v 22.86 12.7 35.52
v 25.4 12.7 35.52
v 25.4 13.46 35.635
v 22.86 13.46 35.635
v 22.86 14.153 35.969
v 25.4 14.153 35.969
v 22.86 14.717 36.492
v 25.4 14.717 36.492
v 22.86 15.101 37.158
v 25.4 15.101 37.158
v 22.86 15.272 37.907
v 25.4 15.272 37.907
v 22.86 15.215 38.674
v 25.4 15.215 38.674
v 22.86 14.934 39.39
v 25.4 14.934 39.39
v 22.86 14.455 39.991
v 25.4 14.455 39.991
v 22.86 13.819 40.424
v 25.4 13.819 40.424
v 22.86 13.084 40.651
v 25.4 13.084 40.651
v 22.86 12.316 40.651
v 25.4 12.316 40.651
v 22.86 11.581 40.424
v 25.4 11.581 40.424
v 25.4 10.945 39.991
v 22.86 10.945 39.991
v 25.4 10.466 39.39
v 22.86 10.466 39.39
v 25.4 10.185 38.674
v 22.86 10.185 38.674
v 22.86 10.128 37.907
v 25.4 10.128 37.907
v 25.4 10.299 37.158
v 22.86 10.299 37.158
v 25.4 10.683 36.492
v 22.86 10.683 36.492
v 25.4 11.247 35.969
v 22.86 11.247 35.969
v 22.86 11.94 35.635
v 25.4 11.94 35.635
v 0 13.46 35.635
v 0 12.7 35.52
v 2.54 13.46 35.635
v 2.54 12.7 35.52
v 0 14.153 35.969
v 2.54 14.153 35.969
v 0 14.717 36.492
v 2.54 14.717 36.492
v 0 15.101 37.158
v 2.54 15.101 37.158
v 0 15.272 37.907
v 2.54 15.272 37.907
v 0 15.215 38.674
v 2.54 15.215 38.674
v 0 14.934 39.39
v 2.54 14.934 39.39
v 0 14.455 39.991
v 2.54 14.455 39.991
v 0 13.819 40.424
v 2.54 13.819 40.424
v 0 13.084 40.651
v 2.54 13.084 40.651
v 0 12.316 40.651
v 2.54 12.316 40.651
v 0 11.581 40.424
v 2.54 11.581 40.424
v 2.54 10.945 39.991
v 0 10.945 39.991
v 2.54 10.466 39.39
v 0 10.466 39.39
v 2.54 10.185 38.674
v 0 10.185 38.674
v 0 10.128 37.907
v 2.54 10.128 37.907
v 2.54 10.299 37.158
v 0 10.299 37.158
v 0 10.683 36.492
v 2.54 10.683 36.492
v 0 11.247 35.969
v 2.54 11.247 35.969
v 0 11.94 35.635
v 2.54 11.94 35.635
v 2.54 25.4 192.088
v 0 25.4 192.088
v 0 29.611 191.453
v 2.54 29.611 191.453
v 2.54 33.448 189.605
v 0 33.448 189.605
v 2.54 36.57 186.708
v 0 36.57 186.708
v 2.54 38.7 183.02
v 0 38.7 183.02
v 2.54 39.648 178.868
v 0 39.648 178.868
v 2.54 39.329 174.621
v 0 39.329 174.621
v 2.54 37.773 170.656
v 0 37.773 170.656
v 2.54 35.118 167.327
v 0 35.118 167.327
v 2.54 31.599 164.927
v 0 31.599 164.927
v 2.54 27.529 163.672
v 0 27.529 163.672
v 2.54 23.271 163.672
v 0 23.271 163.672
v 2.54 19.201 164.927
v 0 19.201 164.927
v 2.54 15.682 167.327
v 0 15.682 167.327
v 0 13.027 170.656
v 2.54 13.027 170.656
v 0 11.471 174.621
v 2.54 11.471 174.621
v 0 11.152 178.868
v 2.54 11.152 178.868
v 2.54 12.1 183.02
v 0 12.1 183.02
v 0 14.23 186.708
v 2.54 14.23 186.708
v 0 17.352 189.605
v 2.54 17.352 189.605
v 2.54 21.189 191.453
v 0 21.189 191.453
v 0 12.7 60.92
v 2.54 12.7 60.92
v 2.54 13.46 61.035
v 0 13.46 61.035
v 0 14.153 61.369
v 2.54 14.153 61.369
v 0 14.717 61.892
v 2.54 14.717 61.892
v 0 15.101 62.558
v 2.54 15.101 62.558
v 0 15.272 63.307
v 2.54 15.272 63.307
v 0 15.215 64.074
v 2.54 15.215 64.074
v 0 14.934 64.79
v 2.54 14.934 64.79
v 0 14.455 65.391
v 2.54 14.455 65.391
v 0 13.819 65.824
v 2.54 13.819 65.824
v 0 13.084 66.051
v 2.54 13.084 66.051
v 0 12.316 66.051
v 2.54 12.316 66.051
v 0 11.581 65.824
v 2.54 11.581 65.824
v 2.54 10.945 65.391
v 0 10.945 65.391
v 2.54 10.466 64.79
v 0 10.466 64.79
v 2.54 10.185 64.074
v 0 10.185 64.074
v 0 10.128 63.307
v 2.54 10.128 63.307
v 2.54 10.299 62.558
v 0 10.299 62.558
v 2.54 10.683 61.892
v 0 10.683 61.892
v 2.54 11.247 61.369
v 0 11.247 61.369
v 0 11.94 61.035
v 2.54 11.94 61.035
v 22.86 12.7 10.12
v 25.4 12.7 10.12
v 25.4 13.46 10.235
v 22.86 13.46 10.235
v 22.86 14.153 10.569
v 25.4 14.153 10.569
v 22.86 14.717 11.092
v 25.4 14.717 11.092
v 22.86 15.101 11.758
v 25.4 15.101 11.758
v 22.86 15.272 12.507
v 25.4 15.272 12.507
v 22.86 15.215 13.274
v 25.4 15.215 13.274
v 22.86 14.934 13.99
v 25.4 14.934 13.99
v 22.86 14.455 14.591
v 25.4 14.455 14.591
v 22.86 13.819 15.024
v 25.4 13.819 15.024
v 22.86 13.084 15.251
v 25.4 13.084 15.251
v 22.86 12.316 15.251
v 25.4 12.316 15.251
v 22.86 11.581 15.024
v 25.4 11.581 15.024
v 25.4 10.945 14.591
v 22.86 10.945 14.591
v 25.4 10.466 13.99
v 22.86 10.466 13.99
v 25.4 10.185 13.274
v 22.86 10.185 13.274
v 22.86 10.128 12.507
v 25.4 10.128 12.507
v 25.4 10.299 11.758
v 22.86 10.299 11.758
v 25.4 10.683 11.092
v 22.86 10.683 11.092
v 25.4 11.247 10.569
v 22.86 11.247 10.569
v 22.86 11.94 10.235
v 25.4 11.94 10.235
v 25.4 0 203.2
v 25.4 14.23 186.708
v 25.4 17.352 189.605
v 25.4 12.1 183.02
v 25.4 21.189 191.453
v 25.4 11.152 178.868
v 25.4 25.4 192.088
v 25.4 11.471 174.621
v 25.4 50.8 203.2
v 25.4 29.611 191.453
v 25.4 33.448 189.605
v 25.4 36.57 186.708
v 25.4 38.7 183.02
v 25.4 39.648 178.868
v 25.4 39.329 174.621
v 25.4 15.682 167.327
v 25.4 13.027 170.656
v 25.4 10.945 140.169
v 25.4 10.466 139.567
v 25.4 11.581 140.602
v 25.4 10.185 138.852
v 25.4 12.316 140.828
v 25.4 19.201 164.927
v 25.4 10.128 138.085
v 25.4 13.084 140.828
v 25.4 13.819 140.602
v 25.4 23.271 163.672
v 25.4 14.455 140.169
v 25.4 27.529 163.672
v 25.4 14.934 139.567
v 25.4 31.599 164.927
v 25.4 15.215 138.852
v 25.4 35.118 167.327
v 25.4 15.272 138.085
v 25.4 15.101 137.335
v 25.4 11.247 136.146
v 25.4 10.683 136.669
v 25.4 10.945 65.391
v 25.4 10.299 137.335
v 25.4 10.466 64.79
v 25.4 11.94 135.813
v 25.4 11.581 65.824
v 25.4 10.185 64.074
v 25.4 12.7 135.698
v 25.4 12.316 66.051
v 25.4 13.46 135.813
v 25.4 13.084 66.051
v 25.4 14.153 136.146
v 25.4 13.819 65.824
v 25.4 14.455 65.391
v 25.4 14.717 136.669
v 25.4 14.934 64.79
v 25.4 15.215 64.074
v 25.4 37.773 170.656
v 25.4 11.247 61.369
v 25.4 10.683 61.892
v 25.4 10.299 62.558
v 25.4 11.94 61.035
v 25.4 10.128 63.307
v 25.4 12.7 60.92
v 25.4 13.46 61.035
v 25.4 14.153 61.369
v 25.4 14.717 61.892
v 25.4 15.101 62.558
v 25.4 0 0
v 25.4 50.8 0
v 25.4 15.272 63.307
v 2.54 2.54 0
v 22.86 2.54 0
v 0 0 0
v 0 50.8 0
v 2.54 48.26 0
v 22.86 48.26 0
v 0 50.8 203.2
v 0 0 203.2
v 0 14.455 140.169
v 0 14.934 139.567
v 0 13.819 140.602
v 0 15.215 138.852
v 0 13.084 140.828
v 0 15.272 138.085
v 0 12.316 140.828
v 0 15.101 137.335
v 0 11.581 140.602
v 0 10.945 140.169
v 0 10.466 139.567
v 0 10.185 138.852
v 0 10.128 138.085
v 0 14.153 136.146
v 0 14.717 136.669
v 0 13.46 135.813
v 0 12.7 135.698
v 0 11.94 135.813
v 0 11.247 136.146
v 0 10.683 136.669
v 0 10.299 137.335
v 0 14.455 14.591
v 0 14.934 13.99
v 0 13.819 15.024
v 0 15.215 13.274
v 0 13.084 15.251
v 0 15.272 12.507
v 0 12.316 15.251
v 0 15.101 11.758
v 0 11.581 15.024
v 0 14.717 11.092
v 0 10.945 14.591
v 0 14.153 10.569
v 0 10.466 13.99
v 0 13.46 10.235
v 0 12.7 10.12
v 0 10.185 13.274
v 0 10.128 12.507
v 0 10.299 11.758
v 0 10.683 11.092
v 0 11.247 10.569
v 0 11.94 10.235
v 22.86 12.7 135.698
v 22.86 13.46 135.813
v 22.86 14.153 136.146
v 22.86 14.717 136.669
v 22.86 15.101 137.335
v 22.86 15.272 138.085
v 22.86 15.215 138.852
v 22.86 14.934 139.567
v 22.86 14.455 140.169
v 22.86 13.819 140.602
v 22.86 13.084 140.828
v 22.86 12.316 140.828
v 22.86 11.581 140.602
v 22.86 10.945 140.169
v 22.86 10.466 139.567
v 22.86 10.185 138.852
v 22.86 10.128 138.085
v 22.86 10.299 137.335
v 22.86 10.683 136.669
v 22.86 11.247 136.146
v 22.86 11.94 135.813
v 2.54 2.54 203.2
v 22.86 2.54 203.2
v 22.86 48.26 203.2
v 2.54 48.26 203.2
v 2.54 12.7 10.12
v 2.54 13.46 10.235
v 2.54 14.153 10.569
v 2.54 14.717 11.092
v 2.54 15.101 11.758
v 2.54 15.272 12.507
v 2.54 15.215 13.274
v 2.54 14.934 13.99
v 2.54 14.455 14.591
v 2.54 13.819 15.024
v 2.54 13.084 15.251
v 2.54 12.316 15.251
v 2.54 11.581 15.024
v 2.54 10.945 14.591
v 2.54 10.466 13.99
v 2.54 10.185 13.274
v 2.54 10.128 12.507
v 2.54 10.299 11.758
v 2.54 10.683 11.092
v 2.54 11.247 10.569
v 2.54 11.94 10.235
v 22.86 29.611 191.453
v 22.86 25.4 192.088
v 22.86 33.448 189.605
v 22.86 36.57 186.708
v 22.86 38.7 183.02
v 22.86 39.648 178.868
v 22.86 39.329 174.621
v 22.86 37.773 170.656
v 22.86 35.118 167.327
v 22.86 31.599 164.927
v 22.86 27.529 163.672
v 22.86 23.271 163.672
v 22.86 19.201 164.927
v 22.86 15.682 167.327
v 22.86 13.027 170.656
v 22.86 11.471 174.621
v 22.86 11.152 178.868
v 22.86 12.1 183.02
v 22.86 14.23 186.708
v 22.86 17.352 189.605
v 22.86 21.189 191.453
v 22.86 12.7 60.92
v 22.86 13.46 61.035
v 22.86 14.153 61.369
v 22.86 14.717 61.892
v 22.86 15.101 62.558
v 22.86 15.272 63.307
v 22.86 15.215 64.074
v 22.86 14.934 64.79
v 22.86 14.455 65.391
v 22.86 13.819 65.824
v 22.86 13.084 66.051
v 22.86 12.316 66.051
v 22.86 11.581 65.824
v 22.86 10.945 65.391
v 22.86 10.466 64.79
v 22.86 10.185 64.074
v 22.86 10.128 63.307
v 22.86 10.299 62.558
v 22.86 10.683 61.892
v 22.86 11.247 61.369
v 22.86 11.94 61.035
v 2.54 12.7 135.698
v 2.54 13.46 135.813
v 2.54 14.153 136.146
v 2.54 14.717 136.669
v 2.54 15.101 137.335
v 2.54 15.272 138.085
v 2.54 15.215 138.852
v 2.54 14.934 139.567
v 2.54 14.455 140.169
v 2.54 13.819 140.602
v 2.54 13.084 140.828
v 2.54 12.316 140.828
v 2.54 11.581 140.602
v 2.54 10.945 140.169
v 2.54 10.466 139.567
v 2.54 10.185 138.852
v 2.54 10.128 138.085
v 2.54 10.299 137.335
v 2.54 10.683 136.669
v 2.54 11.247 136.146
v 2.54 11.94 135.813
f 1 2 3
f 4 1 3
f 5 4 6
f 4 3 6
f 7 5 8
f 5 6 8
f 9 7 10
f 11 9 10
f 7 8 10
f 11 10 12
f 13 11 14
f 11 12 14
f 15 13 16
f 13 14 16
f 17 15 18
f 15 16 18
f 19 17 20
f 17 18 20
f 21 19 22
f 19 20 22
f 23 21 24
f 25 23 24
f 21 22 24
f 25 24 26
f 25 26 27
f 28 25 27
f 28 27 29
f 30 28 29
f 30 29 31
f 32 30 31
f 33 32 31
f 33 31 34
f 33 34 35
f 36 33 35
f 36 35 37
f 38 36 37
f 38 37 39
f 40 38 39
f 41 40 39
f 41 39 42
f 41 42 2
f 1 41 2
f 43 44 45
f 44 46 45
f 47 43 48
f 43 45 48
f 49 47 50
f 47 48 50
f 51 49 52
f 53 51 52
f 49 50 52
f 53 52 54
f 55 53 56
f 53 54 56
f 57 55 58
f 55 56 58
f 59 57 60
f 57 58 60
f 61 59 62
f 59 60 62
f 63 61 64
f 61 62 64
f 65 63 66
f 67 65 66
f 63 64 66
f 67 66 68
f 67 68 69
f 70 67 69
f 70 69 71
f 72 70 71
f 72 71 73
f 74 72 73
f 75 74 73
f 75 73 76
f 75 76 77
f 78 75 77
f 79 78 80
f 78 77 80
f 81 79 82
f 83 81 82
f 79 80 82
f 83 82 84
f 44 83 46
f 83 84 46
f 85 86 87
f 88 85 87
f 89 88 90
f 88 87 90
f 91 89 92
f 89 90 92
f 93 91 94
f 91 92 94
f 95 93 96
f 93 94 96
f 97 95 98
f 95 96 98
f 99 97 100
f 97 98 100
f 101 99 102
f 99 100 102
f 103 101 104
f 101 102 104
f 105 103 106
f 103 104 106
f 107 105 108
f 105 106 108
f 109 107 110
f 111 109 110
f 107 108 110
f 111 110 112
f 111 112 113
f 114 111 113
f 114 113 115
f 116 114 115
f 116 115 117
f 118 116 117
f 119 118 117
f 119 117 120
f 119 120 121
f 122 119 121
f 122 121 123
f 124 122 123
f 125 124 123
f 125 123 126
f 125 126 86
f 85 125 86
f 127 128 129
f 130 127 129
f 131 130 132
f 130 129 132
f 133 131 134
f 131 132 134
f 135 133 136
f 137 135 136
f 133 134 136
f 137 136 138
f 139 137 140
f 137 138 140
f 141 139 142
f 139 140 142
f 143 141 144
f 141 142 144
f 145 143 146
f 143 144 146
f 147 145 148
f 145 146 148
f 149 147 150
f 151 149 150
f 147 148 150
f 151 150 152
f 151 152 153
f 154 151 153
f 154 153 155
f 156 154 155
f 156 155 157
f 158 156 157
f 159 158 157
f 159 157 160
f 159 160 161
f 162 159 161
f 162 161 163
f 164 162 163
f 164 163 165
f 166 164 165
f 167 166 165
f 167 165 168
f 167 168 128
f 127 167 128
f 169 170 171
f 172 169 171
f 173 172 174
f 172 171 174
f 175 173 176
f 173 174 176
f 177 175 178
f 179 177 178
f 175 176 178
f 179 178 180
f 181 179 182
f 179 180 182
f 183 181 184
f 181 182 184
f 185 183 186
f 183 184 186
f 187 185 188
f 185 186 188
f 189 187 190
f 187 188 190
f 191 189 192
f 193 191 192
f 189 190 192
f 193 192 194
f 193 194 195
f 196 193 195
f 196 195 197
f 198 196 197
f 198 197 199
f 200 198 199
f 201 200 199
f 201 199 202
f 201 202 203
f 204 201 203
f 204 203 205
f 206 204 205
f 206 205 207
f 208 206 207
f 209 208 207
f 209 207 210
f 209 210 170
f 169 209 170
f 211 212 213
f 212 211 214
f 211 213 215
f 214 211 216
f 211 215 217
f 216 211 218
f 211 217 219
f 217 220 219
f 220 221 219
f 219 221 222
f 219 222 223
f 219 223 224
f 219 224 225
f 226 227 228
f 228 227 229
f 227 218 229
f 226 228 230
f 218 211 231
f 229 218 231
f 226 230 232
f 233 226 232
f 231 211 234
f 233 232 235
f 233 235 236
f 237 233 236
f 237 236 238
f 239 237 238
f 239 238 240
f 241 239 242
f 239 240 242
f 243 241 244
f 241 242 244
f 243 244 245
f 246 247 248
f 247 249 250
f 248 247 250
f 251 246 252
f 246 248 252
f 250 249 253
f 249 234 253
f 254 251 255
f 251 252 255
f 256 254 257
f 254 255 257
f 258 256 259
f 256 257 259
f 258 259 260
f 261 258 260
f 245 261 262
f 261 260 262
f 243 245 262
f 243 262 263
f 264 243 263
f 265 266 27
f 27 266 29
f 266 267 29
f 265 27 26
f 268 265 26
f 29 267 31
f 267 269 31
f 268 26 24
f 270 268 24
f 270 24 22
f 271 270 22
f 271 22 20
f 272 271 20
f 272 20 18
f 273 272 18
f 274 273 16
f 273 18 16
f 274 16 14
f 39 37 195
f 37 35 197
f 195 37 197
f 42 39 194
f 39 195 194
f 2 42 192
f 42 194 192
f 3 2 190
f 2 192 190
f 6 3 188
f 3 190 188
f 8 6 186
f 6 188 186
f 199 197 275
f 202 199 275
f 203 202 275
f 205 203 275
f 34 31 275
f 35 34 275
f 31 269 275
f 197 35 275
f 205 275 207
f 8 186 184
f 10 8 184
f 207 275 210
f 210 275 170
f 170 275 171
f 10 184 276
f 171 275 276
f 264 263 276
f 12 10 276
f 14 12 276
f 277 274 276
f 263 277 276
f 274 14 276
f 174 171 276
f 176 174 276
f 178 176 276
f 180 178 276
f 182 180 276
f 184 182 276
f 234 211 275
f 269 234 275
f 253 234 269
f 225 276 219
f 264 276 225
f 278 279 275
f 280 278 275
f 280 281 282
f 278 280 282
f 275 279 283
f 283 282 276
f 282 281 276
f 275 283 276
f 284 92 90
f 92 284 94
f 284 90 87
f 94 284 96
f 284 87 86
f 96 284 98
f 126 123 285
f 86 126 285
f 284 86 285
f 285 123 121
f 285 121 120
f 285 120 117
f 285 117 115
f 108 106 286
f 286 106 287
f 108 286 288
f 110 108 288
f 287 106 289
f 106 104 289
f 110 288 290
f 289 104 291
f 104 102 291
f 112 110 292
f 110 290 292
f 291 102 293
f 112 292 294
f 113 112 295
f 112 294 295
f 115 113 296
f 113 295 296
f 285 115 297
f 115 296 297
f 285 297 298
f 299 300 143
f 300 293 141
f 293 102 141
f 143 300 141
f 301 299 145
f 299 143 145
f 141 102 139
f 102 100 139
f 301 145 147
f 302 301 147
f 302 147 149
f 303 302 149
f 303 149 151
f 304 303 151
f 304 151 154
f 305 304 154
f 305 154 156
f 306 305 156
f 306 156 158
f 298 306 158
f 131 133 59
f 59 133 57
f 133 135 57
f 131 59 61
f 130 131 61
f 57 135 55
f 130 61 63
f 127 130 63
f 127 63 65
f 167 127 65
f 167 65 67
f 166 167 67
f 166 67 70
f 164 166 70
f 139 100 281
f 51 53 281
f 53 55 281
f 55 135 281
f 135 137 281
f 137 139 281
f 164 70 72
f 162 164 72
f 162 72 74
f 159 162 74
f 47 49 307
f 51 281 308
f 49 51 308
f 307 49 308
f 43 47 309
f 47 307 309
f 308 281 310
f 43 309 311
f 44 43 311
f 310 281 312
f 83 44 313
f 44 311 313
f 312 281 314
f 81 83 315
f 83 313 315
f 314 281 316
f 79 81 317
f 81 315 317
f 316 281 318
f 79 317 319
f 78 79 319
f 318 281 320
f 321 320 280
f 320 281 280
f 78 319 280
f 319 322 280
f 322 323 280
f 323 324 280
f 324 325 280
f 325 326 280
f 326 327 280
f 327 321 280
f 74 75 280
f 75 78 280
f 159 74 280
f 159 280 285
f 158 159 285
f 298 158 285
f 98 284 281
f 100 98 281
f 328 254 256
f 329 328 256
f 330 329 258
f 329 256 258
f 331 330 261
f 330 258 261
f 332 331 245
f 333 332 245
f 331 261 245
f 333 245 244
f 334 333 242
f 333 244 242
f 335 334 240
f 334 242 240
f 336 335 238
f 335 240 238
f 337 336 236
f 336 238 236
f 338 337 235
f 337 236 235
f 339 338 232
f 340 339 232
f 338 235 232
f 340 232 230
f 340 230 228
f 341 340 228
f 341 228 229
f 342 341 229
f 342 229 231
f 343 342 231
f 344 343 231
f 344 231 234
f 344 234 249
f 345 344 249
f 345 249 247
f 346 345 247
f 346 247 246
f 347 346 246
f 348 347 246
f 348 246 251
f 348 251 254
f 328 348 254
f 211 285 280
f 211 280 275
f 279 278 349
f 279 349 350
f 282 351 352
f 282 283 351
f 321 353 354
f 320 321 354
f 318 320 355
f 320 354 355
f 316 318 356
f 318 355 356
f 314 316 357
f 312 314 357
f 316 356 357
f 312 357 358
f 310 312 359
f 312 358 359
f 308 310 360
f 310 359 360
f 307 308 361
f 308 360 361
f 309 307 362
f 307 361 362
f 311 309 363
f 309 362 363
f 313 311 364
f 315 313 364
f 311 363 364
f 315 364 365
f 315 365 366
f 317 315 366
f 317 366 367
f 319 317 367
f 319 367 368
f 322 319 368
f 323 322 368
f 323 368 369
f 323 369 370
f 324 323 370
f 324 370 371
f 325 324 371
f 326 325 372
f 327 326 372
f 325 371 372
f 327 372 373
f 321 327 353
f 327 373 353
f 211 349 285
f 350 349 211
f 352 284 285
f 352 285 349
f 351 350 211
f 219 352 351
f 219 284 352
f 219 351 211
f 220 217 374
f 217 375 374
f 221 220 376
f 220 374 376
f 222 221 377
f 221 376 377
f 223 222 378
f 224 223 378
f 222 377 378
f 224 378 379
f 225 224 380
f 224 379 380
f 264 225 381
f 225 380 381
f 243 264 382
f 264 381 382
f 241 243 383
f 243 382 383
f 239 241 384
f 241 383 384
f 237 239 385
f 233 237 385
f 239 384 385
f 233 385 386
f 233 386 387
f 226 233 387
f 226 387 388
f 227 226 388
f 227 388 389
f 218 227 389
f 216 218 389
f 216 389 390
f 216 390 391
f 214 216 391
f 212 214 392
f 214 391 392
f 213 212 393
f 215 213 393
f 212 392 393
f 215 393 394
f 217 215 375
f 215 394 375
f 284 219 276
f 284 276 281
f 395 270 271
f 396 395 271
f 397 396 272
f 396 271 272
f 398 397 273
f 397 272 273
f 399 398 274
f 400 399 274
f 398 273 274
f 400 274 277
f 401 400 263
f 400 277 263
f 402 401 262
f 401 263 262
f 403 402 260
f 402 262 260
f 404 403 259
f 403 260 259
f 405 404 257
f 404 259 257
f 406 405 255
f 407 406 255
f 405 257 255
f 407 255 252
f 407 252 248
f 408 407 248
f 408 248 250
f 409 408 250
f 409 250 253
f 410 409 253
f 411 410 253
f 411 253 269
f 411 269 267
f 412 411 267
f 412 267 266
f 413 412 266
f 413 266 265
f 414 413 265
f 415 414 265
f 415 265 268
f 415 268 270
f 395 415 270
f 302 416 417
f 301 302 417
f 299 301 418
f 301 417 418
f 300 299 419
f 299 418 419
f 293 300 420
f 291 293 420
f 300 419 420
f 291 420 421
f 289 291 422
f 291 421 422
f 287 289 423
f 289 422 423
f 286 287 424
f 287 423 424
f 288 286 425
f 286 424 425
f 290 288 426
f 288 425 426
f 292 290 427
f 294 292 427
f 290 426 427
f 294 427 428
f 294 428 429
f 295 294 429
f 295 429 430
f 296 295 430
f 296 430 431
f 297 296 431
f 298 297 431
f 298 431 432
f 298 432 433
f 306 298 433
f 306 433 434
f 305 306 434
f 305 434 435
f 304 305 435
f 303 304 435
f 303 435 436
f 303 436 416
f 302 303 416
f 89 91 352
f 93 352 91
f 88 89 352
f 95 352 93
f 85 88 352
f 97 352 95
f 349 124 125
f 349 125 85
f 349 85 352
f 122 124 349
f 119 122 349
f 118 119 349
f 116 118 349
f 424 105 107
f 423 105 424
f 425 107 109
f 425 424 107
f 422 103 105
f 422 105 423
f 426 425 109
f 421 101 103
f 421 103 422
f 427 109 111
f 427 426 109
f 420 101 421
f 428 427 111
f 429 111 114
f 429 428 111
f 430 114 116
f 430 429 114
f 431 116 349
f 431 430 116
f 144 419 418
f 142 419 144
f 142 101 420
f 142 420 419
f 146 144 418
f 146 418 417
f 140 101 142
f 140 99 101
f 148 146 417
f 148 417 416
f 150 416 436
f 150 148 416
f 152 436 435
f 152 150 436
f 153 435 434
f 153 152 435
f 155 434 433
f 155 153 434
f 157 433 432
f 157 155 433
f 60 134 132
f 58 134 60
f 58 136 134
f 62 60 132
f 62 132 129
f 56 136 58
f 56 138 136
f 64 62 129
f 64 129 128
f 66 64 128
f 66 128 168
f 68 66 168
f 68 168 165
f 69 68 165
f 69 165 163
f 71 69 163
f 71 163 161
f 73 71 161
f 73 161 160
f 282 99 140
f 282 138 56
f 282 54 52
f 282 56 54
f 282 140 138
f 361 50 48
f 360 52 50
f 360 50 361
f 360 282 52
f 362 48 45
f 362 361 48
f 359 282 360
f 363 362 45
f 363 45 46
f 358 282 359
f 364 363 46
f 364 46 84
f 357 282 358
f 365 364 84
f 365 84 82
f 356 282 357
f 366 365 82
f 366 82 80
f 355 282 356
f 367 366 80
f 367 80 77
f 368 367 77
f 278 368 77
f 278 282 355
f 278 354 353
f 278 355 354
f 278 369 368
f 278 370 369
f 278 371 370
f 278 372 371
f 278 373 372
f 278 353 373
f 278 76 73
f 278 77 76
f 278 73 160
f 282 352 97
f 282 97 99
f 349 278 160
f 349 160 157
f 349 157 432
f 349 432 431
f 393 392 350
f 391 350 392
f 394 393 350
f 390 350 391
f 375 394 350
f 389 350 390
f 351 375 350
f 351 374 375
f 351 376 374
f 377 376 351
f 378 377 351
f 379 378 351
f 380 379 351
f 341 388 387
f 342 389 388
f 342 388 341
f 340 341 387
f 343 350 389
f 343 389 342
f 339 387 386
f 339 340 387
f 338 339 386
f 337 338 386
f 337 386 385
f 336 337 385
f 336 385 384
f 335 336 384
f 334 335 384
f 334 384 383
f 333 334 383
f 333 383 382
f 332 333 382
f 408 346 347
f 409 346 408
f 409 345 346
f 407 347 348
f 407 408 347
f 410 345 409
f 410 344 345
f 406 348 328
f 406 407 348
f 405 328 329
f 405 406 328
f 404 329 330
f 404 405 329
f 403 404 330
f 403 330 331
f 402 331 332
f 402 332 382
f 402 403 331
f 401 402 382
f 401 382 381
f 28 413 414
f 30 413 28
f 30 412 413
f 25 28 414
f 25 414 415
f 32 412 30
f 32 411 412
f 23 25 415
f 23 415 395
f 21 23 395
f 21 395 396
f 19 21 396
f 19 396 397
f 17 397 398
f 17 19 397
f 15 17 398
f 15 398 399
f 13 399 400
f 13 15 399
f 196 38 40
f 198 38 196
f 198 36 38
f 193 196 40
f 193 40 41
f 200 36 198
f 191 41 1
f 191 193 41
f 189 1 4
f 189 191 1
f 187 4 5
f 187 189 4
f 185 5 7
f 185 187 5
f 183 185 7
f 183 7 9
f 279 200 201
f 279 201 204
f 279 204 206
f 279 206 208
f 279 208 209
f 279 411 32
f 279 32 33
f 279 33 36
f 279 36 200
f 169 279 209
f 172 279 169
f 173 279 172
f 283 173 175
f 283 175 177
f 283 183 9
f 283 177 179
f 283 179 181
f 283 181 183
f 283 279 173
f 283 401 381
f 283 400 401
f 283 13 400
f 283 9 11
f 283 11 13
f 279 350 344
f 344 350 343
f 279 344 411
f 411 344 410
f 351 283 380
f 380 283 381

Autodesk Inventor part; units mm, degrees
ref_plane "YZ Plane" through (0, 0, 0) normal (1, 0, 0) x (0, 1, 0)
ref_plane "XZ Plane" through (0, 0, 0) normal (0, 1, 0) x (-1, 0, 0)
ref_plane "XY Plane" through (0, 0, 0) normal (0, 0, 1) x (1, 0, 0)
sketch "Sketch1" plane through (0, 0, 0) normal (0, 0, 1) x (1, 0, 0)
  line L0 (0, 0) -> (25.4, 0)
  line L1 (25.4, 0) -> (25.4, 50.8)
  line L2 (25.4, 50.8) -> (0, 50.8)
  line L3 (0, 50.8) -> (0, 0)
  line L4 (22.86, 48.26) -> (2.54, 48.26)
  line L5 (2.54, 48.26) -> (2.54, 2.54)
  line L6 (2.54, 2.54) -> (22.86, 2.54)
  line L7 (22.86, 2.54) -> (22.86, 48.26)
  dimension "d0" = 50.8
  dimension "d1" = 25.4
  dimension "d2" = 2.54
  dimension "d3" = 2.54
  dimension "d4" = 2.54
  dimension "d5" = 2.54
extrude "Extrusion1" add sketch "Sketch1" along normal blind 203.2
sketch "Sketch2" plane through (25.4, 0, 0) normal (1, 0, 0) x (0, 0, -1)
  circle A0 centre (-12.7, 12.7) radius 2.5797
  circle A1 centre (-63.5, 12.7) radius 2.5797
  circle A2 centre (-38.1, 12.7) radius 2.5797
  line L0 (0, 2.54) -> (-203.2, 2.54) projected
  line L1 (0, 0) -> (-203.2, 0) projected
  line L2 (0, 0) -> (0, 50.8) projected
  line L3 (-203.2, 0) -> (-203.2, 50.8) projected
  dimension "d8" = 5.1594
  dimension "d10" = 5.1594
  dimension "d11" = 5.1594
  dimension "d12" = 12.7
  dimension "d13" = 12.7
  dimension "d14" = 12.7
  dimension "d16" = 12.7
  dimension "d18" = 38.1
  dimension "d21" = 25.4
extrude "Extrusion2" cut sketch "Sketch2" against normal blind 203.2 contours A0 | A1 | A2
sketch "Sketch3" plane through (25.4, 0, 0) normal (1, 0, 0) x (0, 0, -1)
  circle A0 centre (-138.2776, 12.7) radius 2.5797
  line L0 (-203.2, 0) -> (-203.2, 50.8) projected
  line L1 (0, 0) -> (-203.2, 0) projected
  dimension "d24" = 5.1594
  dimension "d25" = 64.9224
  dimension "d26" = 12.7
extrude "Extrusion3" cut sketch "Sketch3" against normal blind 203.2
sketch "Sketch4" plane through (0, 0, 0) normal (-1, 0, 0) x (0, 0, 1)
  circle A0 centre (177.8, 25.4) radius 14.2875
  line L0 (203.2, 50.8) -> (203.2, 0) projected
  line L1 (0, 0) -> (203.2, 0) projected
  dimension "d29" = 28.575
  dimension "d31" = 25.4
  dimension "d32" = 25.4
extrude "Extrusion4" cut sketch "Sketch4" against normal blind 25.4
equation "\"d3\" = d2"
equation "\"d4\" = d2"
equation "\"d5\" = d2"
properties part number "1x2"
